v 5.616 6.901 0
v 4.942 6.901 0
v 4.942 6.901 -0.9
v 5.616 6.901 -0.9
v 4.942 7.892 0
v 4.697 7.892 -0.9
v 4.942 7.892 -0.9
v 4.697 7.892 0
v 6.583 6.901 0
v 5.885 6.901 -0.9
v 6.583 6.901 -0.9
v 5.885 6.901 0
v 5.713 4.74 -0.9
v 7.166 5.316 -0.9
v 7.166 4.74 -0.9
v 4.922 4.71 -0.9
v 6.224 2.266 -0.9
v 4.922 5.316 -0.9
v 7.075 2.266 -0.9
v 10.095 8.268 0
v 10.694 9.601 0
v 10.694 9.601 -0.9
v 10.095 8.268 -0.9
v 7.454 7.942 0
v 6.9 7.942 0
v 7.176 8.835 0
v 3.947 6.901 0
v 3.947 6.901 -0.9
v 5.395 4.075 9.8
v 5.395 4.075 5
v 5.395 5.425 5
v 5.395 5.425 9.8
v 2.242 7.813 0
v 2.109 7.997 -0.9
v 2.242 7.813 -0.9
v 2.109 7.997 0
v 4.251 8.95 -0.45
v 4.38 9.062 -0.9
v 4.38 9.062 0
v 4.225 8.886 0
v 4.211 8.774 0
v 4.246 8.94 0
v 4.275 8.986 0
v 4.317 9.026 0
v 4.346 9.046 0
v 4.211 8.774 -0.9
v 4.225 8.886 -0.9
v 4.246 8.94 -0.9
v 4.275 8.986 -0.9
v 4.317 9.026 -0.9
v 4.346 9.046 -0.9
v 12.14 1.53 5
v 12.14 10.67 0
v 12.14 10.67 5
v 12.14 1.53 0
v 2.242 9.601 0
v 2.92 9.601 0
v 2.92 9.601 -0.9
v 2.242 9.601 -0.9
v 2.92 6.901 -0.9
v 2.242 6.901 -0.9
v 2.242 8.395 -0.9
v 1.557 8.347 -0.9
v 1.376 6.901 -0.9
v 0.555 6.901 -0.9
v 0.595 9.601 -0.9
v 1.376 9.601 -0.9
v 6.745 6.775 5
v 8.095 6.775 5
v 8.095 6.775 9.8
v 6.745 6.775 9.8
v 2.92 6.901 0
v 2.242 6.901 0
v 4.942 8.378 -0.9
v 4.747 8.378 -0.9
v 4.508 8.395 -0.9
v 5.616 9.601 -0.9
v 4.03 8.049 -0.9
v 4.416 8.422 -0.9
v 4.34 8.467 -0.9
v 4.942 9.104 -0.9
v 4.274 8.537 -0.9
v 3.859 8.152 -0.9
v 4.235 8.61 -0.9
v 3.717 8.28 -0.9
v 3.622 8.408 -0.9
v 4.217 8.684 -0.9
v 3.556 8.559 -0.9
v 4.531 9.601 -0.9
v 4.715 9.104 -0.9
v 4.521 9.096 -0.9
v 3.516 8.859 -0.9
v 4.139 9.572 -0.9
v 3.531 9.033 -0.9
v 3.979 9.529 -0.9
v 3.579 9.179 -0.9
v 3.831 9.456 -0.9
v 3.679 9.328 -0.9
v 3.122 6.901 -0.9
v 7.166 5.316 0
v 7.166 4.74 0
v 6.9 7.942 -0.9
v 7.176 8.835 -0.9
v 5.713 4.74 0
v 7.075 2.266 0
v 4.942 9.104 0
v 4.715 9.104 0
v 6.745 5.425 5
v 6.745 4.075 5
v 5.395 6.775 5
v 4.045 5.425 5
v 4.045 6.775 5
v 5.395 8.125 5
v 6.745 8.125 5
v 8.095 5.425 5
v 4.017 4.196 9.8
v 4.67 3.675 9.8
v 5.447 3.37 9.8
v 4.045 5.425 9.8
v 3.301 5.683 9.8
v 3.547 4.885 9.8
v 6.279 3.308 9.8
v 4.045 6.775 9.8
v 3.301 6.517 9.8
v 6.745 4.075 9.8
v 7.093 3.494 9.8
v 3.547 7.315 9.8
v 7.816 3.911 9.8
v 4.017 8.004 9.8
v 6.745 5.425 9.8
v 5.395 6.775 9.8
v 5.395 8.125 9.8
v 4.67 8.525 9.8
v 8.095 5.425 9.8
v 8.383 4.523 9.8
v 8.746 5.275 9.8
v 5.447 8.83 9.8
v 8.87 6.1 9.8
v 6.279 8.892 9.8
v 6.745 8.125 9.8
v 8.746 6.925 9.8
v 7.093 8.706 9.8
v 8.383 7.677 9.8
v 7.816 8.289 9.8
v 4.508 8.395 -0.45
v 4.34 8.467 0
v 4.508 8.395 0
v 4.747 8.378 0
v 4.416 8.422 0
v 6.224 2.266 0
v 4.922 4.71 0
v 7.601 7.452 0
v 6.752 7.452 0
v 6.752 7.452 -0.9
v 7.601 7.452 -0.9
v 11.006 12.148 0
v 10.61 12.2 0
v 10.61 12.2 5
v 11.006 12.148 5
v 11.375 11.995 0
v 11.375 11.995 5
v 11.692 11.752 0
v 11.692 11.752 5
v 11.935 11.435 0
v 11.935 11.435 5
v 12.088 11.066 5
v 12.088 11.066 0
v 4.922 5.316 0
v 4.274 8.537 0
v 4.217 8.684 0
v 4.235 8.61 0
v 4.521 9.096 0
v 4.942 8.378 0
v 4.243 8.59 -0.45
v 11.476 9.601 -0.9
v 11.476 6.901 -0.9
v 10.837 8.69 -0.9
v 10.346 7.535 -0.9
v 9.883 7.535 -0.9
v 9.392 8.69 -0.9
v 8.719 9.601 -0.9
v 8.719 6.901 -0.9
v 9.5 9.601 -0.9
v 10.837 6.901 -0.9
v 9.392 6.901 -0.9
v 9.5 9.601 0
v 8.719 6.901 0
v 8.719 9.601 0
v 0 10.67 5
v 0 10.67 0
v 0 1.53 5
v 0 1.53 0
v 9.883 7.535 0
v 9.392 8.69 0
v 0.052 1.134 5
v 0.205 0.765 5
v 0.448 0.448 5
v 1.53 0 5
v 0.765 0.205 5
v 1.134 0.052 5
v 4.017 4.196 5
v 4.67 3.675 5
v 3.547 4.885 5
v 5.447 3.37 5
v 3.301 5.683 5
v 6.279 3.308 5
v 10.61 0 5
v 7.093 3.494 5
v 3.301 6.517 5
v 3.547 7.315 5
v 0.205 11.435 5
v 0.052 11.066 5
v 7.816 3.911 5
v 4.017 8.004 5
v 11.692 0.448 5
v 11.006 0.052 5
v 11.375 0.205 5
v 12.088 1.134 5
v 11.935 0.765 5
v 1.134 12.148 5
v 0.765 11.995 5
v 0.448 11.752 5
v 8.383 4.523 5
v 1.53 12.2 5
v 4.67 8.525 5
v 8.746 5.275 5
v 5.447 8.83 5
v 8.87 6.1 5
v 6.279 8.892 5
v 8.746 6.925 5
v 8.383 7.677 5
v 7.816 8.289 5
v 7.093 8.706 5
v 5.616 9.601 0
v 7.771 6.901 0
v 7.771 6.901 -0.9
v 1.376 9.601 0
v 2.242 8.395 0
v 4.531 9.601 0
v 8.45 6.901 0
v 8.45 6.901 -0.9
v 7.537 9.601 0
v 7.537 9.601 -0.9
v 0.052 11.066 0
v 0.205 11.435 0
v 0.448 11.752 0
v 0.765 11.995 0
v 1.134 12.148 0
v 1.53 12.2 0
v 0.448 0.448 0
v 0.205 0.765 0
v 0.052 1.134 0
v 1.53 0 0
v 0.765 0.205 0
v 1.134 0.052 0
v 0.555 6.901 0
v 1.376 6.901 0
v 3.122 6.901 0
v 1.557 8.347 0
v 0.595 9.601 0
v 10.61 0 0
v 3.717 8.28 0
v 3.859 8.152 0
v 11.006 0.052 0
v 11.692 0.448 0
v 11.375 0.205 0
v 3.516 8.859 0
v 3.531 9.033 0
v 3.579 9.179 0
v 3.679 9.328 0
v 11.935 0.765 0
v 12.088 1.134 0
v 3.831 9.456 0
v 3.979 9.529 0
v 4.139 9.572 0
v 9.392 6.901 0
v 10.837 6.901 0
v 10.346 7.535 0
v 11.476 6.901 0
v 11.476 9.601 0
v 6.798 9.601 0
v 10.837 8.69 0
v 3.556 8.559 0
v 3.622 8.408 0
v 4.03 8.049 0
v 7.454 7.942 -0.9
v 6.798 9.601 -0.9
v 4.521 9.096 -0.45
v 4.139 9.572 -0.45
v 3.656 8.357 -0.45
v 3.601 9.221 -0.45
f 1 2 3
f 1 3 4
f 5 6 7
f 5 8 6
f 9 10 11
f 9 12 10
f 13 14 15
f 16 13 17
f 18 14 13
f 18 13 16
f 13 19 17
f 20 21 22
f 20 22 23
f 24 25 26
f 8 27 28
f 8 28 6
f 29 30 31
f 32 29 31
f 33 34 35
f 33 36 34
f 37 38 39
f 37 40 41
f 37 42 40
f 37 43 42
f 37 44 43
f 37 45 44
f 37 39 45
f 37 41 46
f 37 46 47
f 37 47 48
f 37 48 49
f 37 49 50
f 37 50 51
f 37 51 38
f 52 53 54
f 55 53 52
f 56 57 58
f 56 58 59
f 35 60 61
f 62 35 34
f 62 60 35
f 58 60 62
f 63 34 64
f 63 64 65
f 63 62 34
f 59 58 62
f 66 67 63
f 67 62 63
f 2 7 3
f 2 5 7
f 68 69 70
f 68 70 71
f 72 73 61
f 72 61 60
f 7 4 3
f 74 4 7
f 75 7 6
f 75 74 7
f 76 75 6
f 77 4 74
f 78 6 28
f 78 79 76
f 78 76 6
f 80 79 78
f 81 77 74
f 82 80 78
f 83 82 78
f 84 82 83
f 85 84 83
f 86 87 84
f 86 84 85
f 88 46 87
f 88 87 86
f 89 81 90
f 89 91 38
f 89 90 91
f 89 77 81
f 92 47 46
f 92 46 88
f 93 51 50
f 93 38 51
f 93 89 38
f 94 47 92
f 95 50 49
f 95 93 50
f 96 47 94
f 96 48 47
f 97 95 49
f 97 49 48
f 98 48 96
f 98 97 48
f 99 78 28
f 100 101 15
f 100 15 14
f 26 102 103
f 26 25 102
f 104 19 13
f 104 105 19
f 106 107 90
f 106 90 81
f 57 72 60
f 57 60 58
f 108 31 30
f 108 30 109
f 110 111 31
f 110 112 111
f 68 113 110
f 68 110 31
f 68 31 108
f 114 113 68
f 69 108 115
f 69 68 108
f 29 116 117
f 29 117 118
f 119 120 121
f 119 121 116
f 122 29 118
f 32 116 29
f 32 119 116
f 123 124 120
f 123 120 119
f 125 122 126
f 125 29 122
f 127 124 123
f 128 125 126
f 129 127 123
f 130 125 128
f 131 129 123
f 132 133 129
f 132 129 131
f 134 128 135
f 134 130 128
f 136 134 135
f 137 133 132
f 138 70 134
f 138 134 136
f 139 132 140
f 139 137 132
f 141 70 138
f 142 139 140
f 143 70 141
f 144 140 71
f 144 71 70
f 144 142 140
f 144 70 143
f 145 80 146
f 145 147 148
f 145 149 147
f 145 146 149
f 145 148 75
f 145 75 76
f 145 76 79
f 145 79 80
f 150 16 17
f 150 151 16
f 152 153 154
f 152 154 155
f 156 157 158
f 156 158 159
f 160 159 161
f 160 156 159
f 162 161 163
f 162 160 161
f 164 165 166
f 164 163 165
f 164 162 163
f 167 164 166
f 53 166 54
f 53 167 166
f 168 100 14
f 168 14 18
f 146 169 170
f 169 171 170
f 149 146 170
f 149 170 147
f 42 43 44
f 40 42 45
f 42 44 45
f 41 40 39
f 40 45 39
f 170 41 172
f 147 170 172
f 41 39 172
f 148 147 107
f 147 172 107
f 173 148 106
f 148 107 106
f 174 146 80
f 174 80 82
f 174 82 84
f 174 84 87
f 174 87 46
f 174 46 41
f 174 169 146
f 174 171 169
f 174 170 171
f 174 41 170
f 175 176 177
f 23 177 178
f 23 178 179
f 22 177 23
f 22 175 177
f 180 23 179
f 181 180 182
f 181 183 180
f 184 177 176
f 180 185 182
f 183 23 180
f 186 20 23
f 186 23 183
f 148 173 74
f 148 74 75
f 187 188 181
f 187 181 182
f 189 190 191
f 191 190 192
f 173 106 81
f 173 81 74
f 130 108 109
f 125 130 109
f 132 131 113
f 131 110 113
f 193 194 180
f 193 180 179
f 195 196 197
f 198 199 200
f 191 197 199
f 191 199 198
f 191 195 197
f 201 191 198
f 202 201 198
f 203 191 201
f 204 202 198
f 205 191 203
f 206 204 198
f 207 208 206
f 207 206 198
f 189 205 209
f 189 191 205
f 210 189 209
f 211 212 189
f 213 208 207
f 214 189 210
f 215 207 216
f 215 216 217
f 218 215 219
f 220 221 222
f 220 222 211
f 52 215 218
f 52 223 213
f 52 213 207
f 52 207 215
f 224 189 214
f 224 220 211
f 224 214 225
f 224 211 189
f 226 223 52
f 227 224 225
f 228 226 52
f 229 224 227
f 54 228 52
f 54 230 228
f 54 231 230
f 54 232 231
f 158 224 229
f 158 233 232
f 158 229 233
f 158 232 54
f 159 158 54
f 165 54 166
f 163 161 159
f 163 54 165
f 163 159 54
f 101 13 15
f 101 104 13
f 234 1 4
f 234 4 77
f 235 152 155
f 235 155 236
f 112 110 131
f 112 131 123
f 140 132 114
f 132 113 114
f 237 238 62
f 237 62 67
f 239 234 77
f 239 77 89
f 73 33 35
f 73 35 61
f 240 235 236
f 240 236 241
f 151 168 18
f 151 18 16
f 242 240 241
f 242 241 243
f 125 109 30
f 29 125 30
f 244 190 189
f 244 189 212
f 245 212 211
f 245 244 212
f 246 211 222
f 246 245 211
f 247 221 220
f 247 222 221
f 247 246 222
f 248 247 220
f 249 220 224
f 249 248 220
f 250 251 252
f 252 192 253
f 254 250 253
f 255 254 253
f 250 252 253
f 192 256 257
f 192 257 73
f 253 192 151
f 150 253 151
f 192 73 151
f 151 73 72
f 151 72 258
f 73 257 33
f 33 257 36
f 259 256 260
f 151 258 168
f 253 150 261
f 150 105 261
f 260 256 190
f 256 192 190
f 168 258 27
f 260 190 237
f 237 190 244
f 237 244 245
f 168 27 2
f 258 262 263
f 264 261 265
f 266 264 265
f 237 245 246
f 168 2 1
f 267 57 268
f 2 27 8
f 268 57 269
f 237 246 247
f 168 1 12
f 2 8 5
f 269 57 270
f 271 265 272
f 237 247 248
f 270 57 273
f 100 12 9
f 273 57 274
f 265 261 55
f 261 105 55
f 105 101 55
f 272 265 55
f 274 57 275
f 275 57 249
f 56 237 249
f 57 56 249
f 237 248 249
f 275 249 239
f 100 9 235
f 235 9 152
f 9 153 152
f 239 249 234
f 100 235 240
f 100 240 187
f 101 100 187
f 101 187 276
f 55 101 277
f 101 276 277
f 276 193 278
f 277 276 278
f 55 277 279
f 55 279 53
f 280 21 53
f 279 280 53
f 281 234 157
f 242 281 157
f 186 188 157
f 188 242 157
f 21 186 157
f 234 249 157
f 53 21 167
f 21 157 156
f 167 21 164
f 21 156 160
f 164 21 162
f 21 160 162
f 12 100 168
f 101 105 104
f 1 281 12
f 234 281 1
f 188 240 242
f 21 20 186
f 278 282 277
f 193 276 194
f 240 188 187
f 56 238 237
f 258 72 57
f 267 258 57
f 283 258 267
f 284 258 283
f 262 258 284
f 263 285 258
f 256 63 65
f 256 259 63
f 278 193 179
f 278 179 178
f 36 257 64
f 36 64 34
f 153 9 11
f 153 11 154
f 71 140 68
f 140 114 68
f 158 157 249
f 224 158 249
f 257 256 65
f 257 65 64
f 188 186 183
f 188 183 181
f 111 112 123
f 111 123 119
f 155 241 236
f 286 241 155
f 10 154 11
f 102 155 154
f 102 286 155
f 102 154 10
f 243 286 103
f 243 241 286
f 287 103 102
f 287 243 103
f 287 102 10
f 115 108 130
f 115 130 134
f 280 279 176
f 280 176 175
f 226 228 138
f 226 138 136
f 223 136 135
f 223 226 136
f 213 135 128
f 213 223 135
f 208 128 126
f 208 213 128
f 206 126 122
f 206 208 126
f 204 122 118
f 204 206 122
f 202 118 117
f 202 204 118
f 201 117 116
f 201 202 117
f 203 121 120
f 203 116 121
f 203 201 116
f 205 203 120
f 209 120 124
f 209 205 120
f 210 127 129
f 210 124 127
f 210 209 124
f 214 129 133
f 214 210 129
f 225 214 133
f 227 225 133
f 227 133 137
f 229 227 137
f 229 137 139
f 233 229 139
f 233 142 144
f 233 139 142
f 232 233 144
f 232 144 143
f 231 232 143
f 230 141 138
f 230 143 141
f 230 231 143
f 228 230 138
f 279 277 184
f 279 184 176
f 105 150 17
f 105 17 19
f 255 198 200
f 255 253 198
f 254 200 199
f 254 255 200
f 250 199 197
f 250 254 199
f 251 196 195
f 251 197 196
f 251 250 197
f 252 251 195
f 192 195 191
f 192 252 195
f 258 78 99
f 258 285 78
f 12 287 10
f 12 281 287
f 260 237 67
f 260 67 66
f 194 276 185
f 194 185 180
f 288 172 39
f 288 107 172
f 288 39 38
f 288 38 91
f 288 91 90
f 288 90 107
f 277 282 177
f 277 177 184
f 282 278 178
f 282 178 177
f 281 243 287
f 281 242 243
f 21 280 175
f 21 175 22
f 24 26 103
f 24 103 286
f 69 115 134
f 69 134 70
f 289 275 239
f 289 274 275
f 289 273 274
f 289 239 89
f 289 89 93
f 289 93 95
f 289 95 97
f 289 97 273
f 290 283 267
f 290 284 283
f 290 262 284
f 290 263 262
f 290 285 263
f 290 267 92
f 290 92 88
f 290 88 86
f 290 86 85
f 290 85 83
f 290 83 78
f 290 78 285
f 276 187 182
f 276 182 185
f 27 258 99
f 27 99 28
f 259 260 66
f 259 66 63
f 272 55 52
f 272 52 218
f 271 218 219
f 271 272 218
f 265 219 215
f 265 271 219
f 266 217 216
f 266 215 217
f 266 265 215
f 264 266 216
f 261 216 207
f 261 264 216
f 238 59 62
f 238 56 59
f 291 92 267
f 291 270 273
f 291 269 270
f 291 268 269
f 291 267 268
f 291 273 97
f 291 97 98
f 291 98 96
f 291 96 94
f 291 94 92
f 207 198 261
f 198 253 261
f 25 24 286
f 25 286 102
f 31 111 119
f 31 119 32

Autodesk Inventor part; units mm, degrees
ref_plane "YZ Plane" through (0, 0, 0) normal (1, 0, 0) x (0, 1, 0)
ref_plane "XZ Plane" through (0, 0, 0) normal (0, 1, 0) x (-1, 0, 0)
sketch "Sketch1" plane through (0, 0, 0) normal (0, 0, 1) x (1, 0, 0)
  line L0 (14.6962, 12.74) -> (14.6962, 0) construction
  line L1 (10.61, 12.2) -> (1.53, 12.2)
  arc A0 (1.53, 12.2) -> (0, 10.67) centre (1.53, 10.67) ccw
  line L2 (0, 10.67) -> (0, 1.53)
  arc A1 (0, 1.53) -> (1.53, 0) centre (1.53, 1.53) ccw
  line L3 (1.53, 0) -> (10.61, 0)
  arc A2 (10.61, 0) -> (12.14, 1.53) centre (10.61, 1.53) ccw
  arc A3 (12.14, 10.67) -> (10.61, 12.2) centre (10.61, 10.67) ccw
  line L4 (12.14, 10.67) -> (12.14, 1.53)
  point P0 (0, 0)
  point P1 (0, 0)
  dimension "d10" = 12.74
ref_plane "Work Plane1" through (0, 0, 5) normal (0, 0, 1) x (1, 0, 0)
sketch "Sketch2" plane through (0, 0, 5) normal (0, 0, 1) x (1, 0, 0)
  line L0 (10.88, 12.74) -> (1.8, 12.74) projected
  line L1 (10.88, 12.74) -> (1.8, 12.74) projected
  arc A0 (1.8, 12.74) -> (0, 10.94) centre (1.8, 10.94) ccw projected
  line L2 (0, 10.94) -> (0, 1.8) projected
  arc A1 (0, 1.8) -> (1.8, 0) centre (1.8, 1.8) ccw projected
  line L3 (1.8, 0) -> (10.88, 0) projected
  arc A2 (10.88, 0) -> (12.68, 1.8) centre (10.88, 1.8) ccw projected
  line L4 (12.68, 1.8) -> (12.68, 10.94) projected
  arc A3 (12.68, 10.94) -> (10.88, 12.74) centre (10.88, 10.94) ccw projected
  circle A4 centre (6.34, 6.37) radius 2.8
  line L5 (5.665, 8.395) -> (7.015, 8.395)
  line L6 (7.015, 4.345) -> (5.665, 4.345)
  line L7 (5.665, 4.345) -> (7.015, 8.395) construction
  line L8 (5.665, 8.395) -> (7.015, 4.345) construction
  line L9 (8.365, 5.695) -> (8.365, 7.045)
  line L10 (4.315, 7.045) -> (4.315, 5.695)
  line L11 (4.315, 5.695) -> (8.365, 7.045) construction
  line L12 (8.365, 5.695) -> (4.315, 7.045) construction
  line L13 (4.315, 5.695) -> (5.665, 5.695)
  line L14 (7.015, 5.695) -> (8.365, 5.695)
  line L15 (5.665, 4.345) -> (5.665, 5.695)
  line L16 (5.665, 7.045) -> (5.665, 8.395)
  line L17 (8.365, 7.045) -> (7.015, 7.045)
  line L18 (5.665, 7.045) -> (4.315, 7.045)
  line L19 (7.015, 8.395) -> (7.015, 7.045)
  line L20 (7.015, 5.695) -> (7.015, 4.345)
  point P0 (0, 0)
  dimension "d3" = 5.6
  dimension "d4" = 4.05
  dimension "d5" = 1.35
  dimension "d6" = 4.05
  dimension "d7" = 1.35
extrude "Extrusion3" add sketch "Sketch1" along normal blind 5
sketch "Sketch3" plane through (0, 0, 5) normal (0, 0, 1) x (1, 0, 0)
  line L0 (10.61, 12.47) -> (1.53, 12.47)
  line L1 (10.61, 12.47) -> (1.53, 12.47)
  arc A0 (1.53, 12.47) -> (-0.27, 10.67) centre (1.53, 10.67) ccw
  line L2 (-0.27, 10.67) -> (-0.27, 1.53)
  arc A1 (-0.27, 1.53) -> (1.53, -0.27) centre (1.53, 1.53) ccw
  line L3 (1.53, -0.27) -> (10.61, -0.27)
  arc A2 (10.61, -0.27) -> (12.41, 1.53) centre (10.61, 1.53) ccw
  line L4 (12.41, 1.53) -> (12.41, 10.67)
  arc A3 (12.41, 10.67) -> (10.61, 12.47) centre (10.61, 10.67) ccw
  circle A4 centre (6.07, 6.1) radius 2.8
  line L5 (5.395, 8.125) -> (6.745, 8.125)
  line L6 (6.745, 4.075) -> (5.395, 4.075)
  line L7 (5.395, 4.075) -> (6.745, 8.125) construction
  line L8 (5.395, 8.125) -> (6.745, 4.075) construction
  line L9 (8.095, 5.425) -> (8.095, 6.775)
  line L10 (4.045, 6.775) -> (4.045, 5.425)
  line L11 (4.045, 5.425) -> (8.095, 6.775) construction
  line L12 (8.095, 5.425) -> (4.045, 6.775) construction
  line L13 (4.045, 5.425) -> (5.395, 5.425)
  line L14 (6.745, 5.425) -> (8.095, 5.425)
  line L15 (5.395, 4.075) -> (5.395, 5.425)
  line L16 (5.395, 6.775) -> (5.395, 8.125)
  line L17 (8.095, 6.775) -> (6.745, 6.775)
  line L18 (5.395, 6.775) -> (4.045, 6.775)
  line L19 (6.745, 8.125) -> (6.745, 6.775)
  line L20 (6.745, 5.425) -> (6.745, 4.075)
  line L21 (10.61, 12.2) -> (1.53, 12.2) projected
  line L22 (0, 10.67) -> (0, 1.53) projected
  point P0 (0, 0)
  point P1 (-0.27, -0.27)
  point P2 (6.07, 12.2)
  point P3 (0, 6.1)
  point P4 (6.07, 6.1)
  dimension "d14" = 5.6
  dimension "d15" = 4.05
  dimension "d16" = 1.35
  dimension "d17" = 4.05
  dimension "d18" = 1.35
extrude "Extrusion4" add sketch "Sketch3" along normal blind 4.8 contours A4
sketch "Sketch4" plane through (0, 0, 0) normal (0, 0, -1) x (-1, 0, 0)
  line L0 (-13.9436, 0) -> (-13.9436, 2.266)
  line L1 (-15.5559, 0) -> (-15.5559, 6.84)
  line L2 (-1.53, 0) -> (-10.61, 0) projected
  line L3 (-11.7556, 9.6007) -> (-0.3844, 9.6007) construction
  line L4 (-0.3844, 9.6007) -> (-0.3844, 6.84) construction
  line L5 (-0.3844, 6.84) -> (-11.7556, 6.84) construction
  line L6 (-11.7556, 6.84) -> (-11.7556, 9.6007) construction
  line L7 (-7.4059, 5.316) -> (-4.7341, 5.316) construction
  line L8 (-4.7341, 5.316) -> (-4.7341, 2.266) construction
  line L9 (-4.7341, 2.266) -> (-7.4059, 2.266) construction
  line L10 (-7.4059, 2.266) -> (-7.4059, 5.316) construction
  line L11 (-8.7186, 6.9007) -> (-9.3925, 6.9007)
  line L12 (-9.3925, 6.9007) -> (-9.3925, 8.6905)
  line L13 (-9.3925, 8.6905) -> (-9.8826, 7.5352)
  line L14 (-9.8826, 7.5352) -> (-10.3465, 7.5352)
  line L15 (-10.3465, 7.5352) -> (-10.8366, 8.6905)
  line L16 (-10.8366, 8.6905) -> (-10.8366, 6.9007)
  line L17 (-10.8366, 6.9007) -> (-11.4755, 6.9007)
  line L18 (-11.4755, 6.9007) -> (-11.4755, 9.6007)
  line L19 (-11.4755, 9.6007) -> (-10.6944, 9.6007)
  line L20 (-10.6944, 9.6007) -> (-10.0949, 8.2682)
  line L21 (-10.0949, 8.2682) -> (-9.4997, 9.6007)
  line L22 (-9.4997, 9.6007) -> (-8.7186, 9.6007)
  line L23 (-8.7186, 9.6007) -> (-8.7186, 6.9007)
  line L24 (-8.4495, 6.9007) -> (-7.5371, 9.6007)
  line L25 (-7.5371, 9.6007) -> (-6.7976, 9.6007)
  line L26 (-6.7976, 9.6007) -> (-5.8852, 6.9007)
  line L27 (-5.8852, 6.9007) -> (-6.5831, 6.9007)
  line L28 (-6.5831, 6.9007) -> (-6.7516, 7.4521)
  line L29 (-6.7516, 7.4521) -> (-7.6006, 7.4521)
  line L30 (-7.6006, 7.4521) -> (-7.7712, 6.9007)
  line L31 (-7.7712, 6.9007) -> (-8.4495, 6.9007)
  line L32 (-6.9004, 7.9422) -> (-7.1761, 8.8349)
  line L33 (-7.1761, 8.8349) -> (-7.454, 7.9422)
  line L34 (-7.454, 7.9422) -> (-6.9004, 7.9422)
  line L35 (-3.1217, 6.9007) -> (-3.9466, 6.9007)
  line L36 (-3.9466, 6.9007) -> (-4.6971, 7.8919)
  line L37 (-4.6971, 7.8919) -> (-4.9421, 7.8919)
  line L38 (-4.9421, 7.8919) -> (-4.9421, 6.9007)
  line L39 (-4.9421, 6.9007) -> (-5.616, 6.9007)
  line L40 (-5.616, 6.9007) -> (-5.616, 9.6007)
  line L41 (-5.616, 9.6007) -> (-4.5308, 9.6007)
  spline S0 degree 2 poles (-4.5308, 9.6007) (-4.3054, 9.6007) (-3.9728, 9.5438) (-3.8306, 9.4563) knots 0 0 0 1 2 2 2
  spline S1 degree 2 poles (-3.8306, 9.4563) (-3.6862, 9.3644) (-3.5155, 9.0778) (-3.5155, 8.859) knots 0 0 0 1 2 2 2
  spline S2 degree 2 poles (-3.5155, 8.859) (-3.5155, 8.5505) (-3.7956, 8.1632) (-4.0297, 8.0494) knots 0 0 0 1 2 2 2
  line L42 (-4.0297, 8.0494) -> (-3.1217, 6.9007)
  spline S3 degree 2 poles (-4.2113, 8.7736) (-4.2113, 8.8765) (-4.2901, 9.0231) (-4.3798, 9.0625) knots 0 0 0 1 2 2 2
  spline S4 degree 2 poles (-4.3798, 9.0625) (-4.4433, 9.0887) (-4.5986, 9.104) (-4.7146, 9.104) knots 0 0 0 1 2 2 2
  line L43 (-4.7146, 9.104) -> (-4.9421, 9.104)
  line L44 (-4.9421, 9.104) -> (-4.9421, 8.3776)
  line L45 (-4.9421, 8.3776) -> (-4.7474, 8.3776)
  spline S5 degree 2 poles (-4.7474, 8.3776) (-4.6074, 8.3776) (-4.4082, 8.4126) (-4.3404, 8.4673) knots 0 0 0 1 2 2 2
  spline S6 degree 2 poles (-4.3404, 8.4673) (-4.2748, 8.5198) (-4.2113, 8.6599) (-4.2113, 8.7736) knots 0 0 0 1 2 2 2
  line L46 (-0.5552, 6.9007) -> (-1.3757, 6.9007)
  line L47 (-1.3757, 6.9007) -> (-2.1087, 7.9969)
  line L48 (-2.1087, 7.9969) -> (-2.2421, 7.8131)
  line L49 (-2.2421, 7.8131) -> (-2.2421, 6.9007)
  line L50 (-2.2421, 6.9007) -> (-2.9204, 6.9007)
  line L51 (-2.9204, 6.9007) -> (-2.9204, 9.6007)
  line L52 (-2.9204, 9.6007) -> (-2.2421, 9.6007)
  line L53 (-2.2421, 9.6007) -> (-2.2421, 8.3951)
  line L54 (-2.2421, 8.3951) -> (-1.3757, 9.6007)
  line L55 (-1.3757, 9.6007) -> (-0.5946, 9.6007)
  line L56 (-0.5946, 9.6007) -> (-1.5573, 8.347)
  line L57 (-1.5573, 8.347) -> (-0.5552, 6.9007)
  line L58 (-4.9219, 4.7104) -> (-6.2245, 2.266)
  line L59 (-6.2245, 2.266) -> (-7.0747, 2.266)
  line L60 (-7.0747, 2.266) -> (-5.7128, 4.7401)
  line L61 (-5.7128, 4.7401) -> (-7.1662, 4.7401)
  line L62 (-7.1662, 4.7401) -> (-7.1662, 5.316)
  line L63 (-7.1662, 5.316) -> (-4.9219, 5.316)
  line L64 (-4.9219, 5.316) -> (-4.9219, 4.7104)
  point P0 (0, 0)
  point P1 (-6.07, 0)
  point P2 (-6.07, 2.266)
  point P3 (-6.07, 6.84)
  point P4 (-6.07, 2.266)
  dimension "d21" = 2.266
  dimension "d22" = 6.84
extrude "Extrusion5" add sketch "Sketch4" along normal blind 0.9
properties part number "IPC MARK 7 key"
